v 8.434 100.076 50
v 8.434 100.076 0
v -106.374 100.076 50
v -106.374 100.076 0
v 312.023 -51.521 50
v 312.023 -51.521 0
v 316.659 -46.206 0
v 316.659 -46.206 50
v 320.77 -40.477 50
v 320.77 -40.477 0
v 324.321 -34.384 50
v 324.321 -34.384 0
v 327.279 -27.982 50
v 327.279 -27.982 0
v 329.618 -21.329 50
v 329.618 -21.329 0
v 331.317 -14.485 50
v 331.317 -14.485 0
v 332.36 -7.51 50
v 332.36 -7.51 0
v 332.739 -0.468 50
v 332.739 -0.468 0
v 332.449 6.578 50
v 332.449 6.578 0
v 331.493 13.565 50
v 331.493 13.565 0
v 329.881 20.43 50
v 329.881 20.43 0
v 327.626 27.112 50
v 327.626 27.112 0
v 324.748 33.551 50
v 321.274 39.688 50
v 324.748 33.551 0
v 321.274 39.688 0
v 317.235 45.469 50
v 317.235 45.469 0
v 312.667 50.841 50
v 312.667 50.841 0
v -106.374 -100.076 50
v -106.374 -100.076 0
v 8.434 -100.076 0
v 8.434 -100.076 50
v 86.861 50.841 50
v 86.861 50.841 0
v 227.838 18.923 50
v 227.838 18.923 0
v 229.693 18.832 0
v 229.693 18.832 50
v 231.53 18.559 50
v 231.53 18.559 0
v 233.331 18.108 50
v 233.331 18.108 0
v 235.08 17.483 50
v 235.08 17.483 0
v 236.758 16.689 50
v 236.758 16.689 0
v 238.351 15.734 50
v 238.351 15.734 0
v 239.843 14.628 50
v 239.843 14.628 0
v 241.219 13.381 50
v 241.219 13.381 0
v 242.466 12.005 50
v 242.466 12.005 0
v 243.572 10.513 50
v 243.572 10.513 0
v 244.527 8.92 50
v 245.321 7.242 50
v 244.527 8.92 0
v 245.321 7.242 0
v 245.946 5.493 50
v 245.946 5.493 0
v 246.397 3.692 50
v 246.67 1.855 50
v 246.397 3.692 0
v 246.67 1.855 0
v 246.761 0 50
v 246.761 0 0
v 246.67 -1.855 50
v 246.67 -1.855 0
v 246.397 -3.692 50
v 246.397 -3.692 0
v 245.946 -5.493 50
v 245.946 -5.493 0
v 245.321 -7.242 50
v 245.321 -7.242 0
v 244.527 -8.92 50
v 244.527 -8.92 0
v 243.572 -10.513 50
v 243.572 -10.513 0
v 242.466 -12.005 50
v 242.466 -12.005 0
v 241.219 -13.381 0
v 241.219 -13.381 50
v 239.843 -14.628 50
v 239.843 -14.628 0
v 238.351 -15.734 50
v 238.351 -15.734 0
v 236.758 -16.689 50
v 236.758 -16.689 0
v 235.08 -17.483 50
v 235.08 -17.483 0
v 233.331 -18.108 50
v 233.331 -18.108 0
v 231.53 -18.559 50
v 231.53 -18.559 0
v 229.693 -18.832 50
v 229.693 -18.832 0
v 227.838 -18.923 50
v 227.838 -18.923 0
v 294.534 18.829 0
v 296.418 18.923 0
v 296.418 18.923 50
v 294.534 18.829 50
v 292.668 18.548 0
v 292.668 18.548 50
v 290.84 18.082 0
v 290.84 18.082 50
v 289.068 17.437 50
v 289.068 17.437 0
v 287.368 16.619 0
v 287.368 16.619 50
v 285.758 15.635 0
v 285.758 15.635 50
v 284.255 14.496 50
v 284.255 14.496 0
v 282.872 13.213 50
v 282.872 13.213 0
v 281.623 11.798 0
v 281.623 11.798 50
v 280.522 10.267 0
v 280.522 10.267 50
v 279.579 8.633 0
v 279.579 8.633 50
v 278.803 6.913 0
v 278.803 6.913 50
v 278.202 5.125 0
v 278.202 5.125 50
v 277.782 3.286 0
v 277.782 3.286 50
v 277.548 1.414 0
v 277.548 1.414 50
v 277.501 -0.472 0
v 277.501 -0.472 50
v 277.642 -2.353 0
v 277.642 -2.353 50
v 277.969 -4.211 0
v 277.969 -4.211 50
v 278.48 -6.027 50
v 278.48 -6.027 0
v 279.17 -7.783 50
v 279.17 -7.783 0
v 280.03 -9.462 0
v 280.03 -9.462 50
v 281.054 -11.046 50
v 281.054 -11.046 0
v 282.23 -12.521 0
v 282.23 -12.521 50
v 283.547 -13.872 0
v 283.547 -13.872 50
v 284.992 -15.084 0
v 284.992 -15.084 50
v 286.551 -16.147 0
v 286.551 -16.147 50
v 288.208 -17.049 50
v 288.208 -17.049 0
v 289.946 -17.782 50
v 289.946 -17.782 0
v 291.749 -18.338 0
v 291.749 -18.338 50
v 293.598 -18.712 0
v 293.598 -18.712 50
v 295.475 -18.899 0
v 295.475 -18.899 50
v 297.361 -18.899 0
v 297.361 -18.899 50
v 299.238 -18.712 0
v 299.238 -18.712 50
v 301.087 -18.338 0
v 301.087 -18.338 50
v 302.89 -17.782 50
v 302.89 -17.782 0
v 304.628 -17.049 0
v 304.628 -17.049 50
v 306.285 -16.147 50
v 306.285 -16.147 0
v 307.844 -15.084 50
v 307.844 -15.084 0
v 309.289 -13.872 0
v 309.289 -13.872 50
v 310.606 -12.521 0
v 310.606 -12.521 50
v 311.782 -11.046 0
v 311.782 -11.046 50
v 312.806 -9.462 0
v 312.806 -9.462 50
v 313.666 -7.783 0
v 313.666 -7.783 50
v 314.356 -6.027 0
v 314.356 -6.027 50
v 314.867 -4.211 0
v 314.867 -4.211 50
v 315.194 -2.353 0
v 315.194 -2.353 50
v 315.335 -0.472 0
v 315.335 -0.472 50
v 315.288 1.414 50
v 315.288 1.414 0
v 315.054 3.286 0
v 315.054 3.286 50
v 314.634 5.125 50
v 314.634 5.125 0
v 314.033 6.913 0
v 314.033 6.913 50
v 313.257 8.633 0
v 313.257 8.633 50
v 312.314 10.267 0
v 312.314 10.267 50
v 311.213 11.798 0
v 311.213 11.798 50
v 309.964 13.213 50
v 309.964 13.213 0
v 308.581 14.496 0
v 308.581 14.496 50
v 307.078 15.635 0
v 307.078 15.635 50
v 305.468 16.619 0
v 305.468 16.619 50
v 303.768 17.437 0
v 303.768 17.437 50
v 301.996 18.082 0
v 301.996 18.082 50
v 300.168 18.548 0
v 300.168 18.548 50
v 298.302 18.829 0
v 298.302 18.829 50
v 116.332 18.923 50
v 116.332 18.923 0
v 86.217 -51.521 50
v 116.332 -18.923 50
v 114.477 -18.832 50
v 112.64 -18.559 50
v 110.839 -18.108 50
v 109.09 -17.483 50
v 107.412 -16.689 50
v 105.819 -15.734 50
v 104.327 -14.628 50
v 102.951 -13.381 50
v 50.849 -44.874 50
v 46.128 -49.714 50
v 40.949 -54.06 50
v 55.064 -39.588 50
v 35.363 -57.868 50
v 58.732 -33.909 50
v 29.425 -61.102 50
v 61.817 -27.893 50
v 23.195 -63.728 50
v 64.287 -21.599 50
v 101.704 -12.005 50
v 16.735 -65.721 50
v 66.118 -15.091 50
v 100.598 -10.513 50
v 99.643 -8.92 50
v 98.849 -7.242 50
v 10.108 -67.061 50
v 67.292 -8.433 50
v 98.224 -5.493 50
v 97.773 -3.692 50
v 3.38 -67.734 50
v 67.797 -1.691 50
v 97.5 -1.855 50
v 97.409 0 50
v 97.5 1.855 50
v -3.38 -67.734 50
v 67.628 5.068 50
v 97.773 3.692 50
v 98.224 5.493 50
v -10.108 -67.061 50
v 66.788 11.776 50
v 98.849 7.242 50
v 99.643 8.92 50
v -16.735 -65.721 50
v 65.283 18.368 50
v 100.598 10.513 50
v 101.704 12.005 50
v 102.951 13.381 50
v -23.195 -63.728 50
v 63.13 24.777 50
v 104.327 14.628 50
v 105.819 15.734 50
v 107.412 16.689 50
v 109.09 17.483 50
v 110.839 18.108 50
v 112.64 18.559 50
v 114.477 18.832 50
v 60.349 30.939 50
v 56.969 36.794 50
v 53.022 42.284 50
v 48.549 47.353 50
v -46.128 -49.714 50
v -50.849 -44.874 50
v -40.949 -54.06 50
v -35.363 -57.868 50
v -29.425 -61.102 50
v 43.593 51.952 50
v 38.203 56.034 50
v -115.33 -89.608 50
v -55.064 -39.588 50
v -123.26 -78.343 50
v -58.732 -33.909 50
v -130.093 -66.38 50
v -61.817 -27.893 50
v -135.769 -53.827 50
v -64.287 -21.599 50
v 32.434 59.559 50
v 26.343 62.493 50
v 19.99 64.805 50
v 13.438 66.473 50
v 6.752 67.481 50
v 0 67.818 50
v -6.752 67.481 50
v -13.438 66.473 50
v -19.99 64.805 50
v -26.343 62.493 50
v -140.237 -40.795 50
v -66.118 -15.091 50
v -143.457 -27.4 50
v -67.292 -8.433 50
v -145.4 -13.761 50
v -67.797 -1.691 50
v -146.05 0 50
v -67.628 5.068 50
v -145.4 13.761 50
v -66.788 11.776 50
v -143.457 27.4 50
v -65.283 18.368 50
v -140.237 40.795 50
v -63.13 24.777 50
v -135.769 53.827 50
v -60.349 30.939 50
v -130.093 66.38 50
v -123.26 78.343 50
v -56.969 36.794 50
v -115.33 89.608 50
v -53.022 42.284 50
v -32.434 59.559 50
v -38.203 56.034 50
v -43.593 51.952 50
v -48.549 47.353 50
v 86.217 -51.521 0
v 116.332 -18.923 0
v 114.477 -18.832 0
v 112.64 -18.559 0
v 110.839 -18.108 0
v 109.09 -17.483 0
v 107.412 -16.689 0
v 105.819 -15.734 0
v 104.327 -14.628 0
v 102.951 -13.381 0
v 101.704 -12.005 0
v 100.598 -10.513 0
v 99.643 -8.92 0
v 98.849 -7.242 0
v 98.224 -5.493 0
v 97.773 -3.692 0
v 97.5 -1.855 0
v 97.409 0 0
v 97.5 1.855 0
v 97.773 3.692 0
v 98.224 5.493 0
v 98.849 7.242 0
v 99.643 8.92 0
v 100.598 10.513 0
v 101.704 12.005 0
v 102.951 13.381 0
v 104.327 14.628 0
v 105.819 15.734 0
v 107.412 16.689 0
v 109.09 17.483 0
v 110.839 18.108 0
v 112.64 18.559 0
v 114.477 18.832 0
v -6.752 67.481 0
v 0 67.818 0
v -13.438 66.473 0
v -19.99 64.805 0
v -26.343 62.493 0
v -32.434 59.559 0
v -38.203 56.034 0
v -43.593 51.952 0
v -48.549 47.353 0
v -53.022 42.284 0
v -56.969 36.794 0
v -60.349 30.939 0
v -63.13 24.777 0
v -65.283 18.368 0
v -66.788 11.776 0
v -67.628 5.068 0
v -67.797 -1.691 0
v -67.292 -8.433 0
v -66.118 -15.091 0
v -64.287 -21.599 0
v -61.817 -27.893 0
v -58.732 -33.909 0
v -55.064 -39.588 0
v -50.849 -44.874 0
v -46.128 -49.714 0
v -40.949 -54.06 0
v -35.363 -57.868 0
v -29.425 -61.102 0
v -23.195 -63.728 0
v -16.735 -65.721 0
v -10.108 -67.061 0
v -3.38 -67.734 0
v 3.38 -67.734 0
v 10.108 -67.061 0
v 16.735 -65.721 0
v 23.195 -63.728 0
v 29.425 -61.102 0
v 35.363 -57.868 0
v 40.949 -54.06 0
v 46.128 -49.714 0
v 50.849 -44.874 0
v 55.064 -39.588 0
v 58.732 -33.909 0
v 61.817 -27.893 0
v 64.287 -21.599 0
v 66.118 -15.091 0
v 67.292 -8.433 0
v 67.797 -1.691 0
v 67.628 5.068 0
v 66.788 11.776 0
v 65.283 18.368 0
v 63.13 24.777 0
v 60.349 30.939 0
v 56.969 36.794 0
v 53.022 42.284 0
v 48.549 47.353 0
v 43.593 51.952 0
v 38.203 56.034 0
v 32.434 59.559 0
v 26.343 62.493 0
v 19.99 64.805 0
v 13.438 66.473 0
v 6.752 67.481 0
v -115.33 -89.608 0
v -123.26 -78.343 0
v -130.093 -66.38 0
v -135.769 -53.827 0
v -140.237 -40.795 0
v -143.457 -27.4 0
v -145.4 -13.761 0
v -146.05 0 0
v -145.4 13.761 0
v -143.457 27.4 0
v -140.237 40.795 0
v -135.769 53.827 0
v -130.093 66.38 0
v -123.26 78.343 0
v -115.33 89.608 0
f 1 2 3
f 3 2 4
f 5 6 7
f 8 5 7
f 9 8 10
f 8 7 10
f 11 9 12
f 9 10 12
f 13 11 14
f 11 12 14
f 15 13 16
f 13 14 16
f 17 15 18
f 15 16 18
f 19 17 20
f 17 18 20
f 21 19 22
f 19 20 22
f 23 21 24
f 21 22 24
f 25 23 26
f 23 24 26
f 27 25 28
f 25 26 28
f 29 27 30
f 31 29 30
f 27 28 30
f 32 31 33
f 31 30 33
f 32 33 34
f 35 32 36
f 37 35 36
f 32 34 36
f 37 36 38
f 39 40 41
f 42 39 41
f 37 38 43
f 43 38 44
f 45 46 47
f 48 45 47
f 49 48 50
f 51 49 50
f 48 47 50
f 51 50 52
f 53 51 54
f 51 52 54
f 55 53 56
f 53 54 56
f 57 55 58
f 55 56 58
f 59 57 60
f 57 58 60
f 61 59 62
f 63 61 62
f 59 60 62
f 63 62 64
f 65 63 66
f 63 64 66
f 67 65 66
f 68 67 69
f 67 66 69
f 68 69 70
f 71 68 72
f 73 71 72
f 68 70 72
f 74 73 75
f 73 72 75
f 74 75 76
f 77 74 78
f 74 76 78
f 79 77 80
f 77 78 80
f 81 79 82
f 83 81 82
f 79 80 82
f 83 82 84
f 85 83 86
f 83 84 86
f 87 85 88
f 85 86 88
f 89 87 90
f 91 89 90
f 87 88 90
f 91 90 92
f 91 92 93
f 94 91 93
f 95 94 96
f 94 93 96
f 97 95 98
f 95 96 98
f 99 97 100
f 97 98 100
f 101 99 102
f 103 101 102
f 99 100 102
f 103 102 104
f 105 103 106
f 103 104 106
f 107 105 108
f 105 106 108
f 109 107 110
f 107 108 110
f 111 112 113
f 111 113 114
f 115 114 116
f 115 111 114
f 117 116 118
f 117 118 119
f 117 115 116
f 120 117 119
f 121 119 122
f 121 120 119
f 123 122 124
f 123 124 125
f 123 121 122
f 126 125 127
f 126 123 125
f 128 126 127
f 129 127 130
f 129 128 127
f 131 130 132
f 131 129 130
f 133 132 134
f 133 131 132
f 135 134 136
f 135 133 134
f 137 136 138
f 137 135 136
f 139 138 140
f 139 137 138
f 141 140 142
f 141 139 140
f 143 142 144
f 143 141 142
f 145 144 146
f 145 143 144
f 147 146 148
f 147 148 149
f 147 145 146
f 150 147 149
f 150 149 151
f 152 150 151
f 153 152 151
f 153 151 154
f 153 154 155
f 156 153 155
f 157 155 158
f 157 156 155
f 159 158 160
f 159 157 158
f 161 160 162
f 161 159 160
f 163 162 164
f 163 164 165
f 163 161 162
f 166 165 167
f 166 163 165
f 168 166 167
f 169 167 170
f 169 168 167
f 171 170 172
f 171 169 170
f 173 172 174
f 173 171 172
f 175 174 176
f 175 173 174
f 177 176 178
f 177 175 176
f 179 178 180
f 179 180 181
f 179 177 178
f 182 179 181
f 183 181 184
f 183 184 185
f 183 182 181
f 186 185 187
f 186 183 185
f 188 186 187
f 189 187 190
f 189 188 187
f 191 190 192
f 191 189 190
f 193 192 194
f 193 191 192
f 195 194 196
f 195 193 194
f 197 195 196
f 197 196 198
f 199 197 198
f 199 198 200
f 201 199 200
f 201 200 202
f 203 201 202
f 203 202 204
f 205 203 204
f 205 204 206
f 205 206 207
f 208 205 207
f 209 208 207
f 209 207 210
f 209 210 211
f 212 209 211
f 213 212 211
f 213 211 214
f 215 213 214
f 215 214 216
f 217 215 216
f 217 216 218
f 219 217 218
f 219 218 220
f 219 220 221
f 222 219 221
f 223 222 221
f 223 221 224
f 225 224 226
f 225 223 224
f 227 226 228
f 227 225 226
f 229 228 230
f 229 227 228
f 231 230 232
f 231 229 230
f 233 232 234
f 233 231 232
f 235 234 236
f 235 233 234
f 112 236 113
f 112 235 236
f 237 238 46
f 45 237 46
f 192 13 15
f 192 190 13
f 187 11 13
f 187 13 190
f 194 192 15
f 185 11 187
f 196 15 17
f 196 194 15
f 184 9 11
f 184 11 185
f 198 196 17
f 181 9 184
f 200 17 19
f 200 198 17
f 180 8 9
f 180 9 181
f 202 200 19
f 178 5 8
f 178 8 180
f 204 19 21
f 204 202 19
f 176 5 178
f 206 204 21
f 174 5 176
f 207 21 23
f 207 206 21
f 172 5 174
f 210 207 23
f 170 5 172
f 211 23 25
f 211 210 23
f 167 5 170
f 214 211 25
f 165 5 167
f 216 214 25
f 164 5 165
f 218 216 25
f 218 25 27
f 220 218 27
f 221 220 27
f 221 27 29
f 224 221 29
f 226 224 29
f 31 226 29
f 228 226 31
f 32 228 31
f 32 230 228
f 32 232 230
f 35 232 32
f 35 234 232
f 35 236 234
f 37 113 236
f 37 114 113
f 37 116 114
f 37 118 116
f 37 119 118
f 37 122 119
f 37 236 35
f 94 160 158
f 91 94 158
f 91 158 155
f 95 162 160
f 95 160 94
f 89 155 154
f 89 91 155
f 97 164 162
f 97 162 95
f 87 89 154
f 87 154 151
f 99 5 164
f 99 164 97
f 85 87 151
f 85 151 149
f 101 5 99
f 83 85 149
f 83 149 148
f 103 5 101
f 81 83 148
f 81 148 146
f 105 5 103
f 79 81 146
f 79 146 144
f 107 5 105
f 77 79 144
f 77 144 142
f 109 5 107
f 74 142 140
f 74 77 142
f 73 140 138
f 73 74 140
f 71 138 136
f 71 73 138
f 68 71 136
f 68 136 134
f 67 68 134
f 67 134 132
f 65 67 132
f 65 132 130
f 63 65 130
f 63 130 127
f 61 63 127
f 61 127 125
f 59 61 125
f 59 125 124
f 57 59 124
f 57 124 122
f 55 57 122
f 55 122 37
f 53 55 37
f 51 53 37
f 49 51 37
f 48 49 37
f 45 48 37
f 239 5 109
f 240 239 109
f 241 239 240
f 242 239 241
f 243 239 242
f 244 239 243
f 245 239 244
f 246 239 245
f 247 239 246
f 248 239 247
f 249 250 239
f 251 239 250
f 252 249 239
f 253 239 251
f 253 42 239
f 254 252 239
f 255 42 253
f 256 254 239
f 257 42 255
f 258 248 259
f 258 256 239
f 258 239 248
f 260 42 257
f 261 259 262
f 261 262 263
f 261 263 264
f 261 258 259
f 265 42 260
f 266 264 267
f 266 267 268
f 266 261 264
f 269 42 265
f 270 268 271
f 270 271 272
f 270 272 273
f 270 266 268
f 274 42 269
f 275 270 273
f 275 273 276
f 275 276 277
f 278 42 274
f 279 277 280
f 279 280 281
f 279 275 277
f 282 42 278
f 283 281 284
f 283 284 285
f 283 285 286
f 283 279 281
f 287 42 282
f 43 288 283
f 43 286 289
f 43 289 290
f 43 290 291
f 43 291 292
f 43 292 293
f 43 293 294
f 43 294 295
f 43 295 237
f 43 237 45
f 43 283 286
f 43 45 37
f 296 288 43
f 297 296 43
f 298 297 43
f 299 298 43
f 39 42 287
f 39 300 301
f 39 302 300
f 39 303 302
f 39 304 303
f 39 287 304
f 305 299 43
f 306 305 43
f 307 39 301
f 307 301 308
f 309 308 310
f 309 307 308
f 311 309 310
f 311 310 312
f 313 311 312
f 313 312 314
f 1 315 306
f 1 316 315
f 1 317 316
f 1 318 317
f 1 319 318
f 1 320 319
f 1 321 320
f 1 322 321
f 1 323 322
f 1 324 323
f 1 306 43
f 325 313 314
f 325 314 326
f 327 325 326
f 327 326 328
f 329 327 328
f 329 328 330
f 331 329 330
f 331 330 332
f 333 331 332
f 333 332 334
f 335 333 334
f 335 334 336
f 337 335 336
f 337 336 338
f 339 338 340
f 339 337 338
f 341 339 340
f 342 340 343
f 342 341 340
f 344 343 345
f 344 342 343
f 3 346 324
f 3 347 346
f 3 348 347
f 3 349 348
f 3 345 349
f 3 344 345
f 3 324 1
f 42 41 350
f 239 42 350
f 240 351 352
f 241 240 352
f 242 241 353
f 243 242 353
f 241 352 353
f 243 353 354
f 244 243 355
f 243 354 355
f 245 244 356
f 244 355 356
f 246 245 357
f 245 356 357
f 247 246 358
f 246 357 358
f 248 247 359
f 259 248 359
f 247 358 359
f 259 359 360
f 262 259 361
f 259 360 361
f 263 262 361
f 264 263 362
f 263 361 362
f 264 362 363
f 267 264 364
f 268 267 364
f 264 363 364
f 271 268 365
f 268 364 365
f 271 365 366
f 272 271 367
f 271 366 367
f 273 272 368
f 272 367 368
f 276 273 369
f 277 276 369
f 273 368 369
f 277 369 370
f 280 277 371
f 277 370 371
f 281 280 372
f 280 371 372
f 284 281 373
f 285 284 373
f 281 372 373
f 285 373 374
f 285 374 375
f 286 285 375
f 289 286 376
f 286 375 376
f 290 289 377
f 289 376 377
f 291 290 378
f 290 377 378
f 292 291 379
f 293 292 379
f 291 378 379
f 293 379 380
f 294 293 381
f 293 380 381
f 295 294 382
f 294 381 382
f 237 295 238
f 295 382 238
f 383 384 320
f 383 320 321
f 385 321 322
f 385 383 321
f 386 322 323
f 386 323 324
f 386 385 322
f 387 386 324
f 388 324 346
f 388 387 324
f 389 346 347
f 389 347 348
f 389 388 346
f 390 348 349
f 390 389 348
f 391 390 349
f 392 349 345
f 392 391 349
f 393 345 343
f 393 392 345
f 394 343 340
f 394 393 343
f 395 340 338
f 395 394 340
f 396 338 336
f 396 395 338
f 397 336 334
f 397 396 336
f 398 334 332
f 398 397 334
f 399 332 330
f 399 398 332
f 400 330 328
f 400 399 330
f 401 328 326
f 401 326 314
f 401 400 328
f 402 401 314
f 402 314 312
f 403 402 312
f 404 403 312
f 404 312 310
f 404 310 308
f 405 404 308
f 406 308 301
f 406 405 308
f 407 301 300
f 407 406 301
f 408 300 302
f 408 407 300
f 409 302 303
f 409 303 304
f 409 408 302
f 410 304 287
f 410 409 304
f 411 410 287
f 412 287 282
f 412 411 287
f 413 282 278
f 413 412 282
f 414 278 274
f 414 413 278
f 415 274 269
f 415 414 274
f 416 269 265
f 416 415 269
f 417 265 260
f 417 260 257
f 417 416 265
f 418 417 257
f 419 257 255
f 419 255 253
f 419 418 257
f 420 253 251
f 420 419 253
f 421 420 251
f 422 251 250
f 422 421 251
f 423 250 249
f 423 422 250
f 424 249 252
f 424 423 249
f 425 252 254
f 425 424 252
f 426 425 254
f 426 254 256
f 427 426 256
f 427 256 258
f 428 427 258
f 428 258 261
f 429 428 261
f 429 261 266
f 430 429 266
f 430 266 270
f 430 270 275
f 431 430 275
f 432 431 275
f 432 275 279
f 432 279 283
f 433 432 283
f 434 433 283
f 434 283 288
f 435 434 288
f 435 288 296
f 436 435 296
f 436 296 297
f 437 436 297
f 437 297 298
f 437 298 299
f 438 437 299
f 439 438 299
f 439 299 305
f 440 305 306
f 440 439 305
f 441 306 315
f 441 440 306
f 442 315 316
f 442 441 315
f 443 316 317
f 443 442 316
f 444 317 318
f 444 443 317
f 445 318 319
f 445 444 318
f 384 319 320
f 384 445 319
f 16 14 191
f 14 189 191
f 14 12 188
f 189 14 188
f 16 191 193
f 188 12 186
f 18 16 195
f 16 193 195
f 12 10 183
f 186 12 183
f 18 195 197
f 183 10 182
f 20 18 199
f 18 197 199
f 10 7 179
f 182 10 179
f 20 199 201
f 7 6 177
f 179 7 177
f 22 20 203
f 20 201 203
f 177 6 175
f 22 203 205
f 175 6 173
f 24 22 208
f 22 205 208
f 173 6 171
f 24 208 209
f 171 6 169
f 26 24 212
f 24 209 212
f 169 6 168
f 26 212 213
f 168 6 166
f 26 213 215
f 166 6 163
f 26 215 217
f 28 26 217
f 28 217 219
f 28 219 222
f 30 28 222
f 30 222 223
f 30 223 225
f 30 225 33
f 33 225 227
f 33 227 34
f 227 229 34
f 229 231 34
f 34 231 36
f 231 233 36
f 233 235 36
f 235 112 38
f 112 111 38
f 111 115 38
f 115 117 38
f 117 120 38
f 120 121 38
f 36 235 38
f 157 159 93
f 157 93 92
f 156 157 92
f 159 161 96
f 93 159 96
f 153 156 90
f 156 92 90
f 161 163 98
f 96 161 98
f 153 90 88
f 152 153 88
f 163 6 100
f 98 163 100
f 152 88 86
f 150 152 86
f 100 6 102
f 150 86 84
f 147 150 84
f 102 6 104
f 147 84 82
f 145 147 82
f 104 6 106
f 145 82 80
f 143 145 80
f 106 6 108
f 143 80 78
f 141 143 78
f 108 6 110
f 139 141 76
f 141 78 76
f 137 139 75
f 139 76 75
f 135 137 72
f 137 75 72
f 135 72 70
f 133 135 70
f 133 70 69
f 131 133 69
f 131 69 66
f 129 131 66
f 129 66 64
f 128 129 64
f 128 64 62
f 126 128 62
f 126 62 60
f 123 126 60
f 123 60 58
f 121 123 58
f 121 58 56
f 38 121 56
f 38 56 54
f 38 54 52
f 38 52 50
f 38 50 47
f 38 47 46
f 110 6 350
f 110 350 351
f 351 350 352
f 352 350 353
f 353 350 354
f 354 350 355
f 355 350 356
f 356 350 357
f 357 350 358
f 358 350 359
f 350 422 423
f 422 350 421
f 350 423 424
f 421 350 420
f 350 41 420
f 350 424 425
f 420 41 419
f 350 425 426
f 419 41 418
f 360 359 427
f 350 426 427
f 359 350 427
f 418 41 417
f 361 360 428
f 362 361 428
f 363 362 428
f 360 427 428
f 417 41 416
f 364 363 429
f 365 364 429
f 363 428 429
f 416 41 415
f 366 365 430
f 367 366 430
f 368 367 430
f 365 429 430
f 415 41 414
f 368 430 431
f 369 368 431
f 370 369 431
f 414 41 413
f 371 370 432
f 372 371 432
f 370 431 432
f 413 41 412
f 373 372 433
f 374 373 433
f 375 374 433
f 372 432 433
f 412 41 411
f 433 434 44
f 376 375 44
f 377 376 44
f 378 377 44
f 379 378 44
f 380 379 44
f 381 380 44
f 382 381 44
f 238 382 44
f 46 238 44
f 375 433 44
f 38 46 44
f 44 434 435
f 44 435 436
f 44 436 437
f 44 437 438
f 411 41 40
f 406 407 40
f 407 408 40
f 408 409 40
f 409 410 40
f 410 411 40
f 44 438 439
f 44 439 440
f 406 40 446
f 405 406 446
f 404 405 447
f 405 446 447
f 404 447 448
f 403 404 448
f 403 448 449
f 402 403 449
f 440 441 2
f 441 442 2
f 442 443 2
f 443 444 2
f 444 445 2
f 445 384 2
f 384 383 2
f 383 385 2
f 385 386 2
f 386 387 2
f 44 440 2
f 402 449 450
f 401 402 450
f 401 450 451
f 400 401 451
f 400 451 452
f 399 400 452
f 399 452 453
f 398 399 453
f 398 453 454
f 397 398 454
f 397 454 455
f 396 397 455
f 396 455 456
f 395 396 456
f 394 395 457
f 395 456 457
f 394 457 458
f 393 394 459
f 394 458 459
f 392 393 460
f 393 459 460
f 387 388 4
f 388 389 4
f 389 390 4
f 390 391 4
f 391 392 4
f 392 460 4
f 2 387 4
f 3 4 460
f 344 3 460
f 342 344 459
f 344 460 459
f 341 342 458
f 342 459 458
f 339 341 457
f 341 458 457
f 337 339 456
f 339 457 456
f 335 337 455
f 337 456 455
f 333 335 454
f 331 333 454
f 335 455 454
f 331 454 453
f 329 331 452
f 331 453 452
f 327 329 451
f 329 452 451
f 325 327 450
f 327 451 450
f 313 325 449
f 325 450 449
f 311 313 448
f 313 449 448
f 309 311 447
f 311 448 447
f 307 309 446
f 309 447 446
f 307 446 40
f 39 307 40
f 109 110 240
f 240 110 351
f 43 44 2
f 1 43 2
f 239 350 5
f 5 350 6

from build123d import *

# Parameters (mm, degrees)
CROQUIS1_R                   = 67.818
CROQUIS1_R_2                 = 18.923
SALIENTE_EXTRUIR1_DEPTH      = 50
CORPS_D_PLACER_COPIER1_ANGLE = 90


with BuildPart() as part:
    # Croquis1 → Saliente-Extruir1 (new body)
    with BuildSketch(Plane.XY):
        with BuildLine():
            Line((50.841156462, -86.860973253), (100.076, -8.434146427))
            Line((100.076, -8.434146427), (100.076, 106.373853573))
            ThreePointArc((100.076, 106.373853573), (0, 146.05), (-100.076, 106.373853573))
            Line((-100.076, 106.373853573), (-100.076, -8.434146427))
            Line((-100.076, -8.434146427), (-51.520843538, -86.217090682))
            Line((-51.520843538, -86.217090682), (-51.520843538, -312.023090682))
            ThreePointArc((-51.520843538, -312.023090682), (-0.468123725, -332.738527707), (50.841156462, -312.666973253))
            Line((50.841156462, -312.666973253), (50.841156462, -86.860973253))
        make_face()
        Circle(CROQUIS1_R, mode=Mode.SUBTRACT)
        with Locations((0, -296.418)):
            Circle(CROQUIS1_R_2, mode=Mode.SUBTRACT)
        with BuildLine():
            Line((18.923, -116.332), (18.923, -227.838))
            ThreePointArc((18.923, -227.838), (0, -246.761), (-18.923, -227.838))
            Line((-18.923, -227.838), (-18.923, -116.332))
            ThreePointArc((-18.923, -116.332), (0, -97.409), (18.923, -116.332))
        make_face(mode=Mode.SUBTRACT)
    extrude(amount=SALIENTE_EXTRUIR1_DEPTH)


with BuildPart() as part_1:
    # Corps-Déplacer/Copier1: moved
    add(part.part.rotate(Axis((0, 0, 0), (0, 0, 1)), CORPS_D_PLACER_COPIER1_ANGLE))


solid = part_1.part
